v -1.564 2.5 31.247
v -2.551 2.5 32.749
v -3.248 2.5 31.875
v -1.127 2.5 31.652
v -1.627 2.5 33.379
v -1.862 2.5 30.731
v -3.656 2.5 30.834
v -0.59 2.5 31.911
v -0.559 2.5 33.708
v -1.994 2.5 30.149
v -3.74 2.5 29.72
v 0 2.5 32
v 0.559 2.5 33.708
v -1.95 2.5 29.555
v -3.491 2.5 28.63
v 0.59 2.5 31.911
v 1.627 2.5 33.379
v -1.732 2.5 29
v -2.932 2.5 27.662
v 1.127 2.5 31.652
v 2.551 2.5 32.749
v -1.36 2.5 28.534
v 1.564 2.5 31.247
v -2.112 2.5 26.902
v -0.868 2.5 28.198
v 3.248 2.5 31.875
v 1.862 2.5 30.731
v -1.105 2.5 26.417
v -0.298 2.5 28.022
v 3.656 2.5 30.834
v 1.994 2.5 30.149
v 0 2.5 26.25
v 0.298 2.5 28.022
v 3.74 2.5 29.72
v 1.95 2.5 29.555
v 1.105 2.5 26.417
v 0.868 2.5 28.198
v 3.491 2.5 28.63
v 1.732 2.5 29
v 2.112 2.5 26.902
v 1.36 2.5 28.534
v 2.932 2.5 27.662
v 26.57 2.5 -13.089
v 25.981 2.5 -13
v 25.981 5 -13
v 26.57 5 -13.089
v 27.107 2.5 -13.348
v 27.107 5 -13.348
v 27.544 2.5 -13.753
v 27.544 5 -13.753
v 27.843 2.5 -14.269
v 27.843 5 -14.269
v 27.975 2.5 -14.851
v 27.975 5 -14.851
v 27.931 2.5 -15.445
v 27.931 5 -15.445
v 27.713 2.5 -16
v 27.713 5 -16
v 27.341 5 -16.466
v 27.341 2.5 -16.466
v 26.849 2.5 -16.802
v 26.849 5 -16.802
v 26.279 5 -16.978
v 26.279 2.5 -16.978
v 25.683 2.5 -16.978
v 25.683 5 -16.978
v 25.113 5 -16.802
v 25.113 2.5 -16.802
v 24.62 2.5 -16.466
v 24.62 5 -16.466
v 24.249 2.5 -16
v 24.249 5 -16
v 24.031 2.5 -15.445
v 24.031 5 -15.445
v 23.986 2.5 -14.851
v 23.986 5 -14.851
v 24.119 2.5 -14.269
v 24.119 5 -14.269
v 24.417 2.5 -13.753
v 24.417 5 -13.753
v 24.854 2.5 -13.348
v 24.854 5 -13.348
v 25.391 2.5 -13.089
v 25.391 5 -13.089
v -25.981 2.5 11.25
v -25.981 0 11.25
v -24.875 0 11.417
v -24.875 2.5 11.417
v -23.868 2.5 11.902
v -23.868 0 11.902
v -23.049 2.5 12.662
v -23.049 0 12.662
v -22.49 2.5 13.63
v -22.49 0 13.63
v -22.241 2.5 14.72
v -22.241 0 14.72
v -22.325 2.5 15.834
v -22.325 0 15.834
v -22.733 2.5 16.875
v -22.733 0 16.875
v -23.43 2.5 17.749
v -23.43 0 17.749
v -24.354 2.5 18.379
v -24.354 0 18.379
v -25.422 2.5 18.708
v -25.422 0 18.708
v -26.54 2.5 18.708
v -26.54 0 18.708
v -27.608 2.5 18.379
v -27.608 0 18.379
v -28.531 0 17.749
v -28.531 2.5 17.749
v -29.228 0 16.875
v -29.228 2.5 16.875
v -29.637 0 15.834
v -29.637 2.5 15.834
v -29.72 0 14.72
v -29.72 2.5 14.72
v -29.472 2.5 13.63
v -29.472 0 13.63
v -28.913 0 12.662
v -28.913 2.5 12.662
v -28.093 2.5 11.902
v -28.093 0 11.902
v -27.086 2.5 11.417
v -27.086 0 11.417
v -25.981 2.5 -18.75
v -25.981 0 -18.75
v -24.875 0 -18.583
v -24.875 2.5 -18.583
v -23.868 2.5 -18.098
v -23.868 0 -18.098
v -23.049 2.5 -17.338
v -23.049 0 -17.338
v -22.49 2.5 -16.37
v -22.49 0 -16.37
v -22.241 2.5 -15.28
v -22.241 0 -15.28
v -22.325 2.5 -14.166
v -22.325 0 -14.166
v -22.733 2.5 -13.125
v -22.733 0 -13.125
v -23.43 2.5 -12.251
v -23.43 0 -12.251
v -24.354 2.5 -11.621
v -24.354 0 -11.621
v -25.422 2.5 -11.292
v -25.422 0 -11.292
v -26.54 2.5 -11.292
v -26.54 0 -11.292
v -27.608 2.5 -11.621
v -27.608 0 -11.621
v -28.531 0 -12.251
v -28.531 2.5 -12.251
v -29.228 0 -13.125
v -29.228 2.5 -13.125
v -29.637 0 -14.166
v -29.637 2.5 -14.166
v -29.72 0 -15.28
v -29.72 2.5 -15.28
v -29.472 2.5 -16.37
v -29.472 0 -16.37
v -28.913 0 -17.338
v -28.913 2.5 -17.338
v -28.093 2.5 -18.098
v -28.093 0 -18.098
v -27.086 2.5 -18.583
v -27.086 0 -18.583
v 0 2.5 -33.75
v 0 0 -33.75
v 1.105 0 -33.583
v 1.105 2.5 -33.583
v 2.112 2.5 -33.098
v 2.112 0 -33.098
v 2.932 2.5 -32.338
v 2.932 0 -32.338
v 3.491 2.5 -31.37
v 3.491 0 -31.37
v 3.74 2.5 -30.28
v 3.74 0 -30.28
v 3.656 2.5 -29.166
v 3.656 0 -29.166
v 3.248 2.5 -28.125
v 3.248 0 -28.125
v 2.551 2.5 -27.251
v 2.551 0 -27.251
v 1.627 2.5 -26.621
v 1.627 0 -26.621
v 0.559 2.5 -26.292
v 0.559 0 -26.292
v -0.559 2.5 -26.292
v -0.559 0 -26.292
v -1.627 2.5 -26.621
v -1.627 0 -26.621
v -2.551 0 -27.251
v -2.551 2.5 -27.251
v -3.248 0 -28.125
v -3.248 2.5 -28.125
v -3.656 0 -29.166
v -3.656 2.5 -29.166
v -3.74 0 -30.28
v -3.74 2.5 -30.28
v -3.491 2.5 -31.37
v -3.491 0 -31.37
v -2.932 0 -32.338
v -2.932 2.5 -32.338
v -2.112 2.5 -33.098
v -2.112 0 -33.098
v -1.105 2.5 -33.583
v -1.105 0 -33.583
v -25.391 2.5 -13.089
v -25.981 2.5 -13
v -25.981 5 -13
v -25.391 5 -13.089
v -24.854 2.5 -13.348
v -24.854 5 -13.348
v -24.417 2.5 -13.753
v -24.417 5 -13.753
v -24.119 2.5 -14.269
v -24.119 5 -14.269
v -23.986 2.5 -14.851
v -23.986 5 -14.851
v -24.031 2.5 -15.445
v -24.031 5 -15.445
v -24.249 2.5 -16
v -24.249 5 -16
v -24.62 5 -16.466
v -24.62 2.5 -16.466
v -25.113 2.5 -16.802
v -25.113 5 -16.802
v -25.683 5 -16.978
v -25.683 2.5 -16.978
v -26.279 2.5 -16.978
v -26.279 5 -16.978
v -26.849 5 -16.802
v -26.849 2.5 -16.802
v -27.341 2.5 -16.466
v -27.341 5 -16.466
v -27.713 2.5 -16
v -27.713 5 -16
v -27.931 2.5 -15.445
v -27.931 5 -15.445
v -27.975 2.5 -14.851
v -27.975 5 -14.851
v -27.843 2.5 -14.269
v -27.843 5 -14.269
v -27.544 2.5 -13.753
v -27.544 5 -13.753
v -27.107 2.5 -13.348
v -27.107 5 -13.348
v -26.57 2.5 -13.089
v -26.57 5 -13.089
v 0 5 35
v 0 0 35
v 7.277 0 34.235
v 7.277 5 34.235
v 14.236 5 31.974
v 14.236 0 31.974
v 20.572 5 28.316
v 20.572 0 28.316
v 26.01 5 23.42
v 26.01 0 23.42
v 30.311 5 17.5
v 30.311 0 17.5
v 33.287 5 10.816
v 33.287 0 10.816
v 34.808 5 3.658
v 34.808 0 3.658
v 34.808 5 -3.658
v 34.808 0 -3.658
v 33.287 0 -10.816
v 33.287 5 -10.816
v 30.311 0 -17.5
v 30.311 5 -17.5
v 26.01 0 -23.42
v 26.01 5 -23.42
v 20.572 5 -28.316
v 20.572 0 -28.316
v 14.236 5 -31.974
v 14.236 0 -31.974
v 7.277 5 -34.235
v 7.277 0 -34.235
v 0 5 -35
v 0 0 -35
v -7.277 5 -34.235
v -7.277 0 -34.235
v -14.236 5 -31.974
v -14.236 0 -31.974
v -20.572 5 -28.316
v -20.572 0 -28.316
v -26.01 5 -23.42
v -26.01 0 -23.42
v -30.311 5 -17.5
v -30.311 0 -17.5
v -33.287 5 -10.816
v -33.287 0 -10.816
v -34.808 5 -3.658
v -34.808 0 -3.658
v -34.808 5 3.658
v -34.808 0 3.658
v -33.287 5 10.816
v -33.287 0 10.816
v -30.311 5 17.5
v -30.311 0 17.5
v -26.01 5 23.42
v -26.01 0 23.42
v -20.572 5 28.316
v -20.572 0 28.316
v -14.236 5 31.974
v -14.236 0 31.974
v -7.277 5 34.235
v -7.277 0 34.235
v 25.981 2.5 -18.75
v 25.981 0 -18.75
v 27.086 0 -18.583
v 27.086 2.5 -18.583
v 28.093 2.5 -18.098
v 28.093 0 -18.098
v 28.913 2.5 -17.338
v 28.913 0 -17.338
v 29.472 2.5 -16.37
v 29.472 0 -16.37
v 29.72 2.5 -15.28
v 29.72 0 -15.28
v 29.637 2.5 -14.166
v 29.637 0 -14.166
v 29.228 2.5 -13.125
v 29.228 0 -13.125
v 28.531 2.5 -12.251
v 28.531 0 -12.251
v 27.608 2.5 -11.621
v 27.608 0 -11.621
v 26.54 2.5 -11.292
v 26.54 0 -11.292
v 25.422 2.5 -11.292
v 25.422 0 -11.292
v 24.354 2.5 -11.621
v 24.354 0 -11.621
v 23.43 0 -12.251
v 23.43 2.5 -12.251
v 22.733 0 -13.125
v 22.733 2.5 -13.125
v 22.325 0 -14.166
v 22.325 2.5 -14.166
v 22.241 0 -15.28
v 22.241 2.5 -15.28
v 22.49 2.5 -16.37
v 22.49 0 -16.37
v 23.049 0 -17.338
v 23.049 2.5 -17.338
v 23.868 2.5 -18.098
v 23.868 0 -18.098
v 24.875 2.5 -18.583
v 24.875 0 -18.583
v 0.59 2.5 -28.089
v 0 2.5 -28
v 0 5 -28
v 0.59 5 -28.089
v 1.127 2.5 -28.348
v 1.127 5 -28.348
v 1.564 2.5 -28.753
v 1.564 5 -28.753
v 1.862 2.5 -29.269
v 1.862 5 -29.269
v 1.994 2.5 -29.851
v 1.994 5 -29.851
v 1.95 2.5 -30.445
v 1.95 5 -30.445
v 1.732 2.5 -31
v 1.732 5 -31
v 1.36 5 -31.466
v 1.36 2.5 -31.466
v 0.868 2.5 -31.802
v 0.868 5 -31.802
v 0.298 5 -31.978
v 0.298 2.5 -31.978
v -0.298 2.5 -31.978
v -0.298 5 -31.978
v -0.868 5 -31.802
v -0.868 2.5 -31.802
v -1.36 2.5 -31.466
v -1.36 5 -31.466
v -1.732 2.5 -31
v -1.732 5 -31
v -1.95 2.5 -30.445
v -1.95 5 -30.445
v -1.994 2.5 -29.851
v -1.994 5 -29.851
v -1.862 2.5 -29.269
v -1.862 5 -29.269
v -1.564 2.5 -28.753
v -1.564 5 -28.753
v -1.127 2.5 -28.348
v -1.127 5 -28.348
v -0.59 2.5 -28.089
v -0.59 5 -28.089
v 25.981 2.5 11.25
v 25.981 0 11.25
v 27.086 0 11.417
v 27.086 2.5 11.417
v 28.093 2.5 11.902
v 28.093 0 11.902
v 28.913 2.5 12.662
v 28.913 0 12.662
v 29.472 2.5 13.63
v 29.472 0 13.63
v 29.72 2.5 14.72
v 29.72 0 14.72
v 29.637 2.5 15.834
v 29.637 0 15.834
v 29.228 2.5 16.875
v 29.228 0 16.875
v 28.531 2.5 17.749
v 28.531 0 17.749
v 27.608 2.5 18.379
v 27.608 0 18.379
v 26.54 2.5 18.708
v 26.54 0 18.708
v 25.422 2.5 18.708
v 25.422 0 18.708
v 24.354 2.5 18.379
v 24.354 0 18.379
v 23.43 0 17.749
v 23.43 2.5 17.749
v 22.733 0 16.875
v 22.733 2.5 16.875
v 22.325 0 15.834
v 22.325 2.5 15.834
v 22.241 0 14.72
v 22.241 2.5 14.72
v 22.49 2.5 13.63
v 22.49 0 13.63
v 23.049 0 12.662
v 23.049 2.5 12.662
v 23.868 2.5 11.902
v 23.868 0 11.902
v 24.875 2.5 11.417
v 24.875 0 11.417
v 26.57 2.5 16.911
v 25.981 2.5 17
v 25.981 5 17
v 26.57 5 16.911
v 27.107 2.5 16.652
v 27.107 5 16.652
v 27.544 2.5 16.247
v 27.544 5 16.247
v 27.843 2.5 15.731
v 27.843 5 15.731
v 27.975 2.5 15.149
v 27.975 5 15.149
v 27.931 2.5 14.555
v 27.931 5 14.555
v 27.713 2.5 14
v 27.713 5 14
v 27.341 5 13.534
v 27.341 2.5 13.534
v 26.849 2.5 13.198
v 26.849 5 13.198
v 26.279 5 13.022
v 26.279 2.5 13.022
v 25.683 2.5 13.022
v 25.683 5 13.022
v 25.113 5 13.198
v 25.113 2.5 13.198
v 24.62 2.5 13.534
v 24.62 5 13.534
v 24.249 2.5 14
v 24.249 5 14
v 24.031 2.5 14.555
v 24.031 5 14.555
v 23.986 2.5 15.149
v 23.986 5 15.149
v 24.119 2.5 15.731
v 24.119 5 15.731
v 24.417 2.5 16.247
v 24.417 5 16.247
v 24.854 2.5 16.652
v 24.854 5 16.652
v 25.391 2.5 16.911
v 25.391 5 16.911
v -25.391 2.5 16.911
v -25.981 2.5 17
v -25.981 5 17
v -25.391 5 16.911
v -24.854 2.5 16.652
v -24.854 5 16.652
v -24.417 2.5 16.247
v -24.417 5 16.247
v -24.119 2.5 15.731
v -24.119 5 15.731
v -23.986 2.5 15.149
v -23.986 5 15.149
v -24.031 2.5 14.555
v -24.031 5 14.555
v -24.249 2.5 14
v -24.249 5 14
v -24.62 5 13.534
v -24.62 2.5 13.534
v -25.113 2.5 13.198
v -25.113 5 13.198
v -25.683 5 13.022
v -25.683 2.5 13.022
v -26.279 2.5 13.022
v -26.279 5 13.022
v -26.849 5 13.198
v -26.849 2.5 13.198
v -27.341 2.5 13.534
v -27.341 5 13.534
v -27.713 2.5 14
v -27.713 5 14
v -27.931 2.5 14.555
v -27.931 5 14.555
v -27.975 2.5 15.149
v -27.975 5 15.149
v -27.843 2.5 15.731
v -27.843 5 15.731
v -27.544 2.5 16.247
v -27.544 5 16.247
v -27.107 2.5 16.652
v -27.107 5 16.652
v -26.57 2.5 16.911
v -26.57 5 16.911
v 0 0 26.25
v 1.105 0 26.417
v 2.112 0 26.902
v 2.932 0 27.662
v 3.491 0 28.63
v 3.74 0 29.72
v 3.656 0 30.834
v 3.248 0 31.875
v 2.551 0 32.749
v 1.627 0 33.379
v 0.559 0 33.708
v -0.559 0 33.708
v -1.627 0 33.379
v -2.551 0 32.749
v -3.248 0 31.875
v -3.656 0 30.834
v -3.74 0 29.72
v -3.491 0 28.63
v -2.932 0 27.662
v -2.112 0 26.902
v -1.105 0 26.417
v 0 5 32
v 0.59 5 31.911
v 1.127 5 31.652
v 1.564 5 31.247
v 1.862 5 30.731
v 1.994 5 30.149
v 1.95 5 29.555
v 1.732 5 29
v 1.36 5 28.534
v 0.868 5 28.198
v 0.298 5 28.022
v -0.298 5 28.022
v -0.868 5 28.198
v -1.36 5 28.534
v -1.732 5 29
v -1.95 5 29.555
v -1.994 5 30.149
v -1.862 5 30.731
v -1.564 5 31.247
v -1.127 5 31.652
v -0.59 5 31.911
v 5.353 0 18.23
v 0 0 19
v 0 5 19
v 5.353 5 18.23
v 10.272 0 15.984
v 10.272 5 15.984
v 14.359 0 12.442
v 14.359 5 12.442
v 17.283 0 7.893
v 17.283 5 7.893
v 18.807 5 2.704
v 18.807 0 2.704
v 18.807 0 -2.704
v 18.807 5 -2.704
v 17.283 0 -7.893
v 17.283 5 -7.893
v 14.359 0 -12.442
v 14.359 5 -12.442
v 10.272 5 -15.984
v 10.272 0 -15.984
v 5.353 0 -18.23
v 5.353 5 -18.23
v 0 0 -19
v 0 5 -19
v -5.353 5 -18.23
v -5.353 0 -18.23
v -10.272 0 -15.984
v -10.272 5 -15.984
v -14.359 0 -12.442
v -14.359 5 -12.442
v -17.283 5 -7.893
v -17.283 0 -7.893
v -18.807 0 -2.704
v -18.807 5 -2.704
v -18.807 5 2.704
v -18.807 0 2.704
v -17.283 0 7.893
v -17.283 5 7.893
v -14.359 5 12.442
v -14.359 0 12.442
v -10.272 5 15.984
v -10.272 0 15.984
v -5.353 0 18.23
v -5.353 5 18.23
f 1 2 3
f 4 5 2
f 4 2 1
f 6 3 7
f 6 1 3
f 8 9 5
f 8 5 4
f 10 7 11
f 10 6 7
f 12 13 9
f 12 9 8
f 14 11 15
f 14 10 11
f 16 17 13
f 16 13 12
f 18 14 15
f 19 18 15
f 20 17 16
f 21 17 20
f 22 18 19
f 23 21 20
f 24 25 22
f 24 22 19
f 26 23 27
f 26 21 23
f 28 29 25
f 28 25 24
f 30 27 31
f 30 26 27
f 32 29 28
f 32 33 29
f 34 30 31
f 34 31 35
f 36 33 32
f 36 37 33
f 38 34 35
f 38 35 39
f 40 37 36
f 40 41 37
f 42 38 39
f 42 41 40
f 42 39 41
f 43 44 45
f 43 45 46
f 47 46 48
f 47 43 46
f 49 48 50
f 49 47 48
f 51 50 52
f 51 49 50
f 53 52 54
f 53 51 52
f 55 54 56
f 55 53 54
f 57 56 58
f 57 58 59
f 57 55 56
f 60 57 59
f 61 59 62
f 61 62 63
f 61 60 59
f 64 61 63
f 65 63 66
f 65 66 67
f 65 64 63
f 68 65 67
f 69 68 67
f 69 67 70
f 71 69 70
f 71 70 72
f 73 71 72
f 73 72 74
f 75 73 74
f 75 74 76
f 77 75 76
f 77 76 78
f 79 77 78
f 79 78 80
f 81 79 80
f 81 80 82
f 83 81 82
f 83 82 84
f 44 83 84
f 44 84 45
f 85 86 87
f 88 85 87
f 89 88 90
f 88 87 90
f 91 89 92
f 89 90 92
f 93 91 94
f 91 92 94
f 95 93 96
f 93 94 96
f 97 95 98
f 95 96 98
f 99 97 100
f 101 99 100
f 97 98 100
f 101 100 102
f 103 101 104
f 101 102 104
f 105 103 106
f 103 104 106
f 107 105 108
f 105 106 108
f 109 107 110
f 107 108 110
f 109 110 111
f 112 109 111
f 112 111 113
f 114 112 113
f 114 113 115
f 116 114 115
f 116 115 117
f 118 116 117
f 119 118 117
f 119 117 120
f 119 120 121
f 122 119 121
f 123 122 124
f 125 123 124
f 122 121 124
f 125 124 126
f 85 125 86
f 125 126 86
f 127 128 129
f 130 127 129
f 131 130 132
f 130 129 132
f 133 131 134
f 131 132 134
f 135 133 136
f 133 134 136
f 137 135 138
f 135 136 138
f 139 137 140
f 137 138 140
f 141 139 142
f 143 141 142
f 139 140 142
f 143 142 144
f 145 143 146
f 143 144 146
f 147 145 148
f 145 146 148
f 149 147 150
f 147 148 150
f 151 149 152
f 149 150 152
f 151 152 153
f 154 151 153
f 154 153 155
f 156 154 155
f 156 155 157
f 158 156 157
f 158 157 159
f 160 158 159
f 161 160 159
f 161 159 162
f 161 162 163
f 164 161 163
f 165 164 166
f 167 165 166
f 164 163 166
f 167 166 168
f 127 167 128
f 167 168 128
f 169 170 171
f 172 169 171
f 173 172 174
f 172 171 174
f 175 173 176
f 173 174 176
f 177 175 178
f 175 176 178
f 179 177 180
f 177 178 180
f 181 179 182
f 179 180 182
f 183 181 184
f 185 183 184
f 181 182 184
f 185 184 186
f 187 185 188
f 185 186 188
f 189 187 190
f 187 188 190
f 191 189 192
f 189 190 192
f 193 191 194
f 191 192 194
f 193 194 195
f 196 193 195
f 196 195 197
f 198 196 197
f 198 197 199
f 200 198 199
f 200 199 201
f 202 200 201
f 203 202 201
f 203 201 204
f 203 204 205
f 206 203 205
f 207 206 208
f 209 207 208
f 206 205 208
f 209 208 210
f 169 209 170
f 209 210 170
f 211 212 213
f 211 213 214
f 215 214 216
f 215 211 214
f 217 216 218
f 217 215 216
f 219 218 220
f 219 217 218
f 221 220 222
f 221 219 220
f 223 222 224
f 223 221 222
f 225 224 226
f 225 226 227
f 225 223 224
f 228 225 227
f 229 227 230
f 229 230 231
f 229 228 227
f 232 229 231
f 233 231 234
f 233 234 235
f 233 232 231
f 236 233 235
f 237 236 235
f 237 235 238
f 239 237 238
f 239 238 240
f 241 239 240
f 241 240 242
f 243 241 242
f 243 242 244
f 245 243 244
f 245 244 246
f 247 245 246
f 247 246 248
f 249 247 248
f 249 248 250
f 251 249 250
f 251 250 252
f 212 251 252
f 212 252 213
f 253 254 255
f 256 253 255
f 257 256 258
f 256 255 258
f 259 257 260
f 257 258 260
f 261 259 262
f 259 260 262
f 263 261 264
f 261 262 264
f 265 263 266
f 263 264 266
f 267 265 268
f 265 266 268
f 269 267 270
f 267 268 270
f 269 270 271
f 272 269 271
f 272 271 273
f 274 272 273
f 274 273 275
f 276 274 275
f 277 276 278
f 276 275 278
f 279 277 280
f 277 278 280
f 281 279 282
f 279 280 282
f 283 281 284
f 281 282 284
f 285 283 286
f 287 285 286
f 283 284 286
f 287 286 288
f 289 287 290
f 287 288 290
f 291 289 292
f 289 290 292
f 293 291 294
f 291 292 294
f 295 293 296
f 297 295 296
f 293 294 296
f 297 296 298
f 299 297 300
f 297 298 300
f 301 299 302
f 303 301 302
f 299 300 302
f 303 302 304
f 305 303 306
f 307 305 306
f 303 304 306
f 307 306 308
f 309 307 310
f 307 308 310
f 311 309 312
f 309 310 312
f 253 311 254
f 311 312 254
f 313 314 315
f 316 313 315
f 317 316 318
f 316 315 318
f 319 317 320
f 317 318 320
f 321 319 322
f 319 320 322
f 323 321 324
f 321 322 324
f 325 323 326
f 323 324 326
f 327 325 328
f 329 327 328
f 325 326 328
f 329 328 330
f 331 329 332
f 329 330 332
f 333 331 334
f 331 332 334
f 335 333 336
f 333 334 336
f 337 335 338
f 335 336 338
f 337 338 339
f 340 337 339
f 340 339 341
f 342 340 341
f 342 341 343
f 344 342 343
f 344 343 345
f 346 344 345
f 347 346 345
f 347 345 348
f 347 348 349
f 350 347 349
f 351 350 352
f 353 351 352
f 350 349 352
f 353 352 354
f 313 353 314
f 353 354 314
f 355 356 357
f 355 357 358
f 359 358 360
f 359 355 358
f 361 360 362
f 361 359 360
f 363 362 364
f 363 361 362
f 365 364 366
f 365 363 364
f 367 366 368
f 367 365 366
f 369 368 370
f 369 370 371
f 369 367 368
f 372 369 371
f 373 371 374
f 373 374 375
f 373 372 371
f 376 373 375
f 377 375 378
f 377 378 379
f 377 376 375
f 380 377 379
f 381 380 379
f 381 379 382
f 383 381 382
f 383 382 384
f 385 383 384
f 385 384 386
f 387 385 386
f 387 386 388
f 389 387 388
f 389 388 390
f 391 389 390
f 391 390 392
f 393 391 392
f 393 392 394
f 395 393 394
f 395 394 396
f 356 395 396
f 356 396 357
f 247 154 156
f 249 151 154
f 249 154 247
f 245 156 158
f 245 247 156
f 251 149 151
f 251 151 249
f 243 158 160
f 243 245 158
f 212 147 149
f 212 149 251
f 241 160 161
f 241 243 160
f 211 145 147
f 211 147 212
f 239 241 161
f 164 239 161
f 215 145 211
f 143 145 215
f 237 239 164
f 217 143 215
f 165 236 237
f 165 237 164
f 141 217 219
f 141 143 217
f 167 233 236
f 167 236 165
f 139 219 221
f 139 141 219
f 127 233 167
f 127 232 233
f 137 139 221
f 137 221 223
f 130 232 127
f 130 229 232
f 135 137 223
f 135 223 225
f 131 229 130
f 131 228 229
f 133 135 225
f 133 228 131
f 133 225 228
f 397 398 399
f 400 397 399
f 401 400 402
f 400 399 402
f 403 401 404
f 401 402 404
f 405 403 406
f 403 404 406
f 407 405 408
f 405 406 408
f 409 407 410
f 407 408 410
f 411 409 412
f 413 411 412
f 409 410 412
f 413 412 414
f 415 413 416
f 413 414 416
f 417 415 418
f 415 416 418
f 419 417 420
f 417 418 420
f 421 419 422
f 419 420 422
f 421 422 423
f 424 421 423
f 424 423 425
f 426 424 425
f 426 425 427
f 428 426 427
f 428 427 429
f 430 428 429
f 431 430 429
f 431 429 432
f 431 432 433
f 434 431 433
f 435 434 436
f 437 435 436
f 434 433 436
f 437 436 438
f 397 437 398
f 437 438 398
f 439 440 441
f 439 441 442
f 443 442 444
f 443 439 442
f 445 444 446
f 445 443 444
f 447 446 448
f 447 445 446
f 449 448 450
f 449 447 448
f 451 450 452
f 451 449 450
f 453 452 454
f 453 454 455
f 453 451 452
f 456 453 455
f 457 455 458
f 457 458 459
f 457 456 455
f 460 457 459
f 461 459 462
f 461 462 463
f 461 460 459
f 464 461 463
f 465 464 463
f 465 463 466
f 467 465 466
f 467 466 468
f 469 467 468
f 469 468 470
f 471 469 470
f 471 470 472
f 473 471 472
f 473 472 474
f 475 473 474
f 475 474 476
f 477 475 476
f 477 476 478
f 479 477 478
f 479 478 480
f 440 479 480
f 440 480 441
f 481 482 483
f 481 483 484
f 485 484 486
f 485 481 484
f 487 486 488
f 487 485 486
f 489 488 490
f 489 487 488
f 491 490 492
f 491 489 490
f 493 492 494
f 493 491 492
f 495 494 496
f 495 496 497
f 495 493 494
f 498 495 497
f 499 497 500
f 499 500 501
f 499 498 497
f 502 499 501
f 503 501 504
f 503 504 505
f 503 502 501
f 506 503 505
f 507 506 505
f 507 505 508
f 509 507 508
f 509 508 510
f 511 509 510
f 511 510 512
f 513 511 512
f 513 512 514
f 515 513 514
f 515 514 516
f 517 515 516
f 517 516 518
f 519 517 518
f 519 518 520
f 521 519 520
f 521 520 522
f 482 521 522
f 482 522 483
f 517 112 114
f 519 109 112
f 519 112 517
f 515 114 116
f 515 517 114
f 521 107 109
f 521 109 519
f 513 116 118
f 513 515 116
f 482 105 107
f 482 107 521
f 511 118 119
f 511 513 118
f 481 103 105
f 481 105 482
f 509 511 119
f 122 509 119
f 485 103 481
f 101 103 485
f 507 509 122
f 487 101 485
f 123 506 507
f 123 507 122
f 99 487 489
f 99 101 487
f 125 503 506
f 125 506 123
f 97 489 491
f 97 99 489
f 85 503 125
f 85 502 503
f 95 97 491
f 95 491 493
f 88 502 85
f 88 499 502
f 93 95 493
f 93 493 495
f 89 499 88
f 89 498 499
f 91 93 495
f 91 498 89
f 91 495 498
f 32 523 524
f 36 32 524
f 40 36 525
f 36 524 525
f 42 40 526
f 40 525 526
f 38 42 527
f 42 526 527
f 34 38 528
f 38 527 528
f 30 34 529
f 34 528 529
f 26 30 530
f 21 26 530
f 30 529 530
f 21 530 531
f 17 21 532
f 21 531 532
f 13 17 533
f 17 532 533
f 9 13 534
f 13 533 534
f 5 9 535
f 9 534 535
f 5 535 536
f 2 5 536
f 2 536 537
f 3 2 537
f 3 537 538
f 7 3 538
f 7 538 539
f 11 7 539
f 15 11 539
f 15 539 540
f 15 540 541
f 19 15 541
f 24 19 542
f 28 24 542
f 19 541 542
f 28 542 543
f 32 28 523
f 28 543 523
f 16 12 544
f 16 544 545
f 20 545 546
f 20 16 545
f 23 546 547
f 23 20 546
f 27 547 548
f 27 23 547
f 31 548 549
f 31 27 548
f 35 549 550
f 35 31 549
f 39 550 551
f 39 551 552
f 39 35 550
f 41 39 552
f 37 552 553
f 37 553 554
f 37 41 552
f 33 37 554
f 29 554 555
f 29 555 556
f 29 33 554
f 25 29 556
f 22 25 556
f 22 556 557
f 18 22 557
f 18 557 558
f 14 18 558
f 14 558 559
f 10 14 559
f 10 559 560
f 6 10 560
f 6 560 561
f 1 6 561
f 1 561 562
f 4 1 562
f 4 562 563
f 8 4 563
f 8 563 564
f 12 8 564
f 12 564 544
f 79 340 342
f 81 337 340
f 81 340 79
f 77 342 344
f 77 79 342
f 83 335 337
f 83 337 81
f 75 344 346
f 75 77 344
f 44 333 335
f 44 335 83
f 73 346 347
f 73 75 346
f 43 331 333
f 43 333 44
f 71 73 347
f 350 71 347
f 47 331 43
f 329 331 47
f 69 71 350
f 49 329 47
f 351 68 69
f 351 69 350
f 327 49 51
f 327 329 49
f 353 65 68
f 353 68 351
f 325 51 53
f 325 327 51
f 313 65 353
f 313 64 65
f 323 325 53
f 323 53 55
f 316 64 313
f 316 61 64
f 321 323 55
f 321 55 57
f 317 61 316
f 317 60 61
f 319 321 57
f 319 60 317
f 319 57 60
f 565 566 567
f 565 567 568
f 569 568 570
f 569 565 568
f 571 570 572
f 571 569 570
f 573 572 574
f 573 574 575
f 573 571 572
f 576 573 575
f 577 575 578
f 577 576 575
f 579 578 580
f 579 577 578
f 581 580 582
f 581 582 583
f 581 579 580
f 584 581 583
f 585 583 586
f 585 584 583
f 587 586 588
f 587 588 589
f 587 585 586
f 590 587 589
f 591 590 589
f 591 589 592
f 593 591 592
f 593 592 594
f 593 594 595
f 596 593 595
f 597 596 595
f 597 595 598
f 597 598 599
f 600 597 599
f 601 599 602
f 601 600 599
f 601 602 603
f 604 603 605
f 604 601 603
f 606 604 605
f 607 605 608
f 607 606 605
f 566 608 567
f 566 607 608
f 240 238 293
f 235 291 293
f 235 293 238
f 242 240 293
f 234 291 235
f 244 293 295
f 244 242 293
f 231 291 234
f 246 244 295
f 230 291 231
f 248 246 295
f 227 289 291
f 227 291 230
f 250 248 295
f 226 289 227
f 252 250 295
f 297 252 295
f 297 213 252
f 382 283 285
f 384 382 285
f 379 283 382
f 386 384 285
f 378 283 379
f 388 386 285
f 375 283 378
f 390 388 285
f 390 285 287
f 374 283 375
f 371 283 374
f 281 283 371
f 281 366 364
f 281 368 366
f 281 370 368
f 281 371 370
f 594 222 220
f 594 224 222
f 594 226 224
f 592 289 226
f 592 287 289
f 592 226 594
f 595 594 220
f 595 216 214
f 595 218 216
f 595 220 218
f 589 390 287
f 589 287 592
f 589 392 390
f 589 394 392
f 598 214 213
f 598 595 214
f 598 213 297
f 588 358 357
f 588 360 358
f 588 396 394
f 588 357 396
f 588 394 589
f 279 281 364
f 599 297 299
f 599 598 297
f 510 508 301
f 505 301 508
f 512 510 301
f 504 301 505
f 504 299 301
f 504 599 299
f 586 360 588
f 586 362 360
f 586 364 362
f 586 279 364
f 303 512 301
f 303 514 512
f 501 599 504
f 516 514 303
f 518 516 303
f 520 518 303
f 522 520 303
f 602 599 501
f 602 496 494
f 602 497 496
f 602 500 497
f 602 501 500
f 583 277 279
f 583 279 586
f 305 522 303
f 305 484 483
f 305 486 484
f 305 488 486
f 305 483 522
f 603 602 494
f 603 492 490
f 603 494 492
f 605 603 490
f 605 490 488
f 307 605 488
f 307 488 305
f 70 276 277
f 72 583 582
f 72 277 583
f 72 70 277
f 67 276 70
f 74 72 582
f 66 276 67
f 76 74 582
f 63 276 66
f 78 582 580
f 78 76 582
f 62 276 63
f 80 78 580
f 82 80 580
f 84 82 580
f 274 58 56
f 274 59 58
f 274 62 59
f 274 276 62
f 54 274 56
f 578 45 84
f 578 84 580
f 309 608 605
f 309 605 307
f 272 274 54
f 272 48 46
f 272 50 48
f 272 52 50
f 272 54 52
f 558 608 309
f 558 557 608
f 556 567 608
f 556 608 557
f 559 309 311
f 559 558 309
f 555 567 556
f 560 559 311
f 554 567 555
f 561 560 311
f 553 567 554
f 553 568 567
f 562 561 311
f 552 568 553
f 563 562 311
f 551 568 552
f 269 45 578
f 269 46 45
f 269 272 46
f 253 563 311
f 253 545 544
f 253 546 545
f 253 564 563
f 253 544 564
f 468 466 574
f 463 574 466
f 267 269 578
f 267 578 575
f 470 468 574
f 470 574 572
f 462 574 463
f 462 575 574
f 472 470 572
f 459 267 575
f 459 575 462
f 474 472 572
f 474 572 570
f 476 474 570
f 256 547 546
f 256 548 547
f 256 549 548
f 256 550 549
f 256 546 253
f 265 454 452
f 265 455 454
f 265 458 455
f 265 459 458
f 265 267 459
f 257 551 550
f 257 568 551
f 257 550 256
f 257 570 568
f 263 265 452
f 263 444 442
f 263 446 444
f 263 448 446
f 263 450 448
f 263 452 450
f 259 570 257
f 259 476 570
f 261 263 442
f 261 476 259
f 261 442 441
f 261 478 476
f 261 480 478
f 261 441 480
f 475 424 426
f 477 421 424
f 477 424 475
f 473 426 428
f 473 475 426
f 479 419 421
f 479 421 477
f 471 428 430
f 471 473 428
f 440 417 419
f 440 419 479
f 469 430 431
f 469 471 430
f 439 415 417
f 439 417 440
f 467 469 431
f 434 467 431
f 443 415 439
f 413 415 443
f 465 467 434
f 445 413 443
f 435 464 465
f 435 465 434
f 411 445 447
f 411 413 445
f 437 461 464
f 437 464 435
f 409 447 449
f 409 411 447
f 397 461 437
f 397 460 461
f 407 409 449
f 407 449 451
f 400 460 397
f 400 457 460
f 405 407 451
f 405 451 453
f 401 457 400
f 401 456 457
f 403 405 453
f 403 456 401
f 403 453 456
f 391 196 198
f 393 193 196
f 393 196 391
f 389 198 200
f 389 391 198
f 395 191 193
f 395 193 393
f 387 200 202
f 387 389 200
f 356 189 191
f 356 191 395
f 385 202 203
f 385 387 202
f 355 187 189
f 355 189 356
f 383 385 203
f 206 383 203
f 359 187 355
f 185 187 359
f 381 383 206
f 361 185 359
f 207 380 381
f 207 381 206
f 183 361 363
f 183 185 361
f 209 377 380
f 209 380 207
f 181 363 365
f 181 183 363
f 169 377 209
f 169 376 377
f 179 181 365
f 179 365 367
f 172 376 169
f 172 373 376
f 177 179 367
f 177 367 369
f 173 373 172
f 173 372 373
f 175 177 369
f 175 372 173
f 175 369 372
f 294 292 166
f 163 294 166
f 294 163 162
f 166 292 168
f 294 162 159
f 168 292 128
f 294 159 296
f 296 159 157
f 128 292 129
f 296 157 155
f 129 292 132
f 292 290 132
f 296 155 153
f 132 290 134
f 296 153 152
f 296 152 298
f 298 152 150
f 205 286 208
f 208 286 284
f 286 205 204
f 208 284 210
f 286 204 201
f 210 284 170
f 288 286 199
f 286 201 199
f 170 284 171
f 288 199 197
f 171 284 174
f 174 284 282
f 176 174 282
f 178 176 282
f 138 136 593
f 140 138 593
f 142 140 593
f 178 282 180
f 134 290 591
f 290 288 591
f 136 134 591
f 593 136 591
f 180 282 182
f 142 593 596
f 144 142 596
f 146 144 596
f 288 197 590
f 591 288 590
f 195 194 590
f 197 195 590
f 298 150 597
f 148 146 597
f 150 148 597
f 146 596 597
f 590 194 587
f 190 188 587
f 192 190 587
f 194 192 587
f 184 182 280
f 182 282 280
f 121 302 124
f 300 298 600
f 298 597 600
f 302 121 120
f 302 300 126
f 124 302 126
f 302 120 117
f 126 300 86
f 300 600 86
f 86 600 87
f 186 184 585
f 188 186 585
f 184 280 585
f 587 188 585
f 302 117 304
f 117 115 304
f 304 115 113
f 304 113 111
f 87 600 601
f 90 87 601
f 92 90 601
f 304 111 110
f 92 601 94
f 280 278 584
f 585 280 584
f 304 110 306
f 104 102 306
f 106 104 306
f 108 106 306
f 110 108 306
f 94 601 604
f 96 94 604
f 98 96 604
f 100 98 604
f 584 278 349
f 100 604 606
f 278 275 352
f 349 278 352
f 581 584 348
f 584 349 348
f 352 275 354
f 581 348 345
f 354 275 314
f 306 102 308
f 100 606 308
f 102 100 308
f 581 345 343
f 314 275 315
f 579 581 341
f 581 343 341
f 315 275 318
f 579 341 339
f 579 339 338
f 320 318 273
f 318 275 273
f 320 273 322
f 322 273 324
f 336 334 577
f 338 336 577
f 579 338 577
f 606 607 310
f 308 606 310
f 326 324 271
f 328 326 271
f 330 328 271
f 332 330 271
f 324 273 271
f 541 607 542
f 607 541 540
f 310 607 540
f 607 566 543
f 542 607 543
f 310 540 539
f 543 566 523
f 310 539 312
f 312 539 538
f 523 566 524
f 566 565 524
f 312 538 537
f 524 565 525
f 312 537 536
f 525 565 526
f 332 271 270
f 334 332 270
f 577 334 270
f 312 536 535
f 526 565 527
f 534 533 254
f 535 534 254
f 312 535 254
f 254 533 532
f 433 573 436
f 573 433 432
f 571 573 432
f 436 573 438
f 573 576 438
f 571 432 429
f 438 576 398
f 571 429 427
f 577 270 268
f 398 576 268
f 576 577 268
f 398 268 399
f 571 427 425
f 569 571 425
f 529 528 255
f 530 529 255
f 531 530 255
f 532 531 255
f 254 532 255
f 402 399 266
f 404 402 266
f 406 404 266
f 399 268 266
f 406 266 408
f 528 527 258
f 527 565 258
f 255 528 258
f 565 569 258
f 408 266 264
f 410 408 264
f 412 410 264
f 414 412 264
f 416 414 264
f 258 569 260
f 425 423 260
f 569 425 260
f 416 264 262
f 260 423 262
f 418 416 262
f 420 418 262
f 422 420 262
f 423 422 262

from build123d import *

# Parameters (mm, degrees)
SKETCH_1_R          = 35
SKETCH_1_R_2        = 19
SKETCH_1_R_3        = 2
EXTRUDE_1_DEPTH     = 5
SKETCH_2_R          = 3.75
CUT_EXTRUDE_1_DEPTH = 2.5


with BuildPart() as part:
    # 草图1 → 凸台-拉伸1 (new body)
    with BuildSketch(Plane(origin=(0, 0, 0), x_dir=(1, 0, 0), z_dir=(0, 1, 0))):
        with Locations(Location((0, 0, 0), (0, 0, 270))):
            Circle(SKETCH_1_R)
        with Locations(Location((0, 0, 0), (0, 0, 270))):
            Circle(SKETCH_1_R_2, mode=Mode.SUBTRACT)
        with Locations(Location((0, 30, 0), (0, 0, 270))):
            Circle(SKETCH_1_R_3, mode=Mode.SUBTRACT)
        with Locations(Location((25.980762114, 15, 0), (0, 0, 270))):
            Circle(SKETCH_1_R_3, mode=Mode.SUBTRACT)
        with Locations(Location((25.980762114, -15, 0), (0, 0, 270))):
            Circle(SKETCH_1_R_3, mode=Mode.SUBTRACT)
        with Locations(Location((0, -30, 0), (0, 0, 270))):
            Circle(SKETCH_1_R_3, mode=Mode.SUBTRACT)
        with Locations(Location((-25.980762114, -15, 0), (0, 0, 270))):
            Circle(SKETCH_1_R_3, mode=Mode.SUBTRACT)
        with Locations(Location((-25.980762114, 15, 0), (0, 0, 270))):
            Circle(SKETCH_1_R_3, mode=Mode.SUBTRACT)
    extrude(amount=EXTRUDE_1_DEPTH)

    # 草图2 → 切除-拉伸1 (cut)
    with BuildSketch(Plane.XZ):
        with Locations(Location((0, 30, 0), (0, 0, 270))):
            Circle(SKETCH_2_R)
        with Locations(Location((25.980762114, 15, 0), (0, 0, 270))):
            Circle(SKETCH_2_R)
        with Locations(Location((25.980762114, -15, 0), (0, 0, 270))):
            Circle(SKETCH_2_R)
        with Locations(Location((0, -30, 0), (0, 0, 270))):
            Circle(SKETCH_2_R)
        with Locations(Location((-25.980762114, -15, 0), (0, 0, 270))):
            Circle(SKETCH_2_R)
        with Locations(Location((-25.980762114, 15, 0), (0, 0, 270))):
            Circle(SKETCH_2_R)
    extrude(amount=-CUT_EXTRUDE_1_DEPTH, mode=Mode.SUBTRACT)


solid = part.part
